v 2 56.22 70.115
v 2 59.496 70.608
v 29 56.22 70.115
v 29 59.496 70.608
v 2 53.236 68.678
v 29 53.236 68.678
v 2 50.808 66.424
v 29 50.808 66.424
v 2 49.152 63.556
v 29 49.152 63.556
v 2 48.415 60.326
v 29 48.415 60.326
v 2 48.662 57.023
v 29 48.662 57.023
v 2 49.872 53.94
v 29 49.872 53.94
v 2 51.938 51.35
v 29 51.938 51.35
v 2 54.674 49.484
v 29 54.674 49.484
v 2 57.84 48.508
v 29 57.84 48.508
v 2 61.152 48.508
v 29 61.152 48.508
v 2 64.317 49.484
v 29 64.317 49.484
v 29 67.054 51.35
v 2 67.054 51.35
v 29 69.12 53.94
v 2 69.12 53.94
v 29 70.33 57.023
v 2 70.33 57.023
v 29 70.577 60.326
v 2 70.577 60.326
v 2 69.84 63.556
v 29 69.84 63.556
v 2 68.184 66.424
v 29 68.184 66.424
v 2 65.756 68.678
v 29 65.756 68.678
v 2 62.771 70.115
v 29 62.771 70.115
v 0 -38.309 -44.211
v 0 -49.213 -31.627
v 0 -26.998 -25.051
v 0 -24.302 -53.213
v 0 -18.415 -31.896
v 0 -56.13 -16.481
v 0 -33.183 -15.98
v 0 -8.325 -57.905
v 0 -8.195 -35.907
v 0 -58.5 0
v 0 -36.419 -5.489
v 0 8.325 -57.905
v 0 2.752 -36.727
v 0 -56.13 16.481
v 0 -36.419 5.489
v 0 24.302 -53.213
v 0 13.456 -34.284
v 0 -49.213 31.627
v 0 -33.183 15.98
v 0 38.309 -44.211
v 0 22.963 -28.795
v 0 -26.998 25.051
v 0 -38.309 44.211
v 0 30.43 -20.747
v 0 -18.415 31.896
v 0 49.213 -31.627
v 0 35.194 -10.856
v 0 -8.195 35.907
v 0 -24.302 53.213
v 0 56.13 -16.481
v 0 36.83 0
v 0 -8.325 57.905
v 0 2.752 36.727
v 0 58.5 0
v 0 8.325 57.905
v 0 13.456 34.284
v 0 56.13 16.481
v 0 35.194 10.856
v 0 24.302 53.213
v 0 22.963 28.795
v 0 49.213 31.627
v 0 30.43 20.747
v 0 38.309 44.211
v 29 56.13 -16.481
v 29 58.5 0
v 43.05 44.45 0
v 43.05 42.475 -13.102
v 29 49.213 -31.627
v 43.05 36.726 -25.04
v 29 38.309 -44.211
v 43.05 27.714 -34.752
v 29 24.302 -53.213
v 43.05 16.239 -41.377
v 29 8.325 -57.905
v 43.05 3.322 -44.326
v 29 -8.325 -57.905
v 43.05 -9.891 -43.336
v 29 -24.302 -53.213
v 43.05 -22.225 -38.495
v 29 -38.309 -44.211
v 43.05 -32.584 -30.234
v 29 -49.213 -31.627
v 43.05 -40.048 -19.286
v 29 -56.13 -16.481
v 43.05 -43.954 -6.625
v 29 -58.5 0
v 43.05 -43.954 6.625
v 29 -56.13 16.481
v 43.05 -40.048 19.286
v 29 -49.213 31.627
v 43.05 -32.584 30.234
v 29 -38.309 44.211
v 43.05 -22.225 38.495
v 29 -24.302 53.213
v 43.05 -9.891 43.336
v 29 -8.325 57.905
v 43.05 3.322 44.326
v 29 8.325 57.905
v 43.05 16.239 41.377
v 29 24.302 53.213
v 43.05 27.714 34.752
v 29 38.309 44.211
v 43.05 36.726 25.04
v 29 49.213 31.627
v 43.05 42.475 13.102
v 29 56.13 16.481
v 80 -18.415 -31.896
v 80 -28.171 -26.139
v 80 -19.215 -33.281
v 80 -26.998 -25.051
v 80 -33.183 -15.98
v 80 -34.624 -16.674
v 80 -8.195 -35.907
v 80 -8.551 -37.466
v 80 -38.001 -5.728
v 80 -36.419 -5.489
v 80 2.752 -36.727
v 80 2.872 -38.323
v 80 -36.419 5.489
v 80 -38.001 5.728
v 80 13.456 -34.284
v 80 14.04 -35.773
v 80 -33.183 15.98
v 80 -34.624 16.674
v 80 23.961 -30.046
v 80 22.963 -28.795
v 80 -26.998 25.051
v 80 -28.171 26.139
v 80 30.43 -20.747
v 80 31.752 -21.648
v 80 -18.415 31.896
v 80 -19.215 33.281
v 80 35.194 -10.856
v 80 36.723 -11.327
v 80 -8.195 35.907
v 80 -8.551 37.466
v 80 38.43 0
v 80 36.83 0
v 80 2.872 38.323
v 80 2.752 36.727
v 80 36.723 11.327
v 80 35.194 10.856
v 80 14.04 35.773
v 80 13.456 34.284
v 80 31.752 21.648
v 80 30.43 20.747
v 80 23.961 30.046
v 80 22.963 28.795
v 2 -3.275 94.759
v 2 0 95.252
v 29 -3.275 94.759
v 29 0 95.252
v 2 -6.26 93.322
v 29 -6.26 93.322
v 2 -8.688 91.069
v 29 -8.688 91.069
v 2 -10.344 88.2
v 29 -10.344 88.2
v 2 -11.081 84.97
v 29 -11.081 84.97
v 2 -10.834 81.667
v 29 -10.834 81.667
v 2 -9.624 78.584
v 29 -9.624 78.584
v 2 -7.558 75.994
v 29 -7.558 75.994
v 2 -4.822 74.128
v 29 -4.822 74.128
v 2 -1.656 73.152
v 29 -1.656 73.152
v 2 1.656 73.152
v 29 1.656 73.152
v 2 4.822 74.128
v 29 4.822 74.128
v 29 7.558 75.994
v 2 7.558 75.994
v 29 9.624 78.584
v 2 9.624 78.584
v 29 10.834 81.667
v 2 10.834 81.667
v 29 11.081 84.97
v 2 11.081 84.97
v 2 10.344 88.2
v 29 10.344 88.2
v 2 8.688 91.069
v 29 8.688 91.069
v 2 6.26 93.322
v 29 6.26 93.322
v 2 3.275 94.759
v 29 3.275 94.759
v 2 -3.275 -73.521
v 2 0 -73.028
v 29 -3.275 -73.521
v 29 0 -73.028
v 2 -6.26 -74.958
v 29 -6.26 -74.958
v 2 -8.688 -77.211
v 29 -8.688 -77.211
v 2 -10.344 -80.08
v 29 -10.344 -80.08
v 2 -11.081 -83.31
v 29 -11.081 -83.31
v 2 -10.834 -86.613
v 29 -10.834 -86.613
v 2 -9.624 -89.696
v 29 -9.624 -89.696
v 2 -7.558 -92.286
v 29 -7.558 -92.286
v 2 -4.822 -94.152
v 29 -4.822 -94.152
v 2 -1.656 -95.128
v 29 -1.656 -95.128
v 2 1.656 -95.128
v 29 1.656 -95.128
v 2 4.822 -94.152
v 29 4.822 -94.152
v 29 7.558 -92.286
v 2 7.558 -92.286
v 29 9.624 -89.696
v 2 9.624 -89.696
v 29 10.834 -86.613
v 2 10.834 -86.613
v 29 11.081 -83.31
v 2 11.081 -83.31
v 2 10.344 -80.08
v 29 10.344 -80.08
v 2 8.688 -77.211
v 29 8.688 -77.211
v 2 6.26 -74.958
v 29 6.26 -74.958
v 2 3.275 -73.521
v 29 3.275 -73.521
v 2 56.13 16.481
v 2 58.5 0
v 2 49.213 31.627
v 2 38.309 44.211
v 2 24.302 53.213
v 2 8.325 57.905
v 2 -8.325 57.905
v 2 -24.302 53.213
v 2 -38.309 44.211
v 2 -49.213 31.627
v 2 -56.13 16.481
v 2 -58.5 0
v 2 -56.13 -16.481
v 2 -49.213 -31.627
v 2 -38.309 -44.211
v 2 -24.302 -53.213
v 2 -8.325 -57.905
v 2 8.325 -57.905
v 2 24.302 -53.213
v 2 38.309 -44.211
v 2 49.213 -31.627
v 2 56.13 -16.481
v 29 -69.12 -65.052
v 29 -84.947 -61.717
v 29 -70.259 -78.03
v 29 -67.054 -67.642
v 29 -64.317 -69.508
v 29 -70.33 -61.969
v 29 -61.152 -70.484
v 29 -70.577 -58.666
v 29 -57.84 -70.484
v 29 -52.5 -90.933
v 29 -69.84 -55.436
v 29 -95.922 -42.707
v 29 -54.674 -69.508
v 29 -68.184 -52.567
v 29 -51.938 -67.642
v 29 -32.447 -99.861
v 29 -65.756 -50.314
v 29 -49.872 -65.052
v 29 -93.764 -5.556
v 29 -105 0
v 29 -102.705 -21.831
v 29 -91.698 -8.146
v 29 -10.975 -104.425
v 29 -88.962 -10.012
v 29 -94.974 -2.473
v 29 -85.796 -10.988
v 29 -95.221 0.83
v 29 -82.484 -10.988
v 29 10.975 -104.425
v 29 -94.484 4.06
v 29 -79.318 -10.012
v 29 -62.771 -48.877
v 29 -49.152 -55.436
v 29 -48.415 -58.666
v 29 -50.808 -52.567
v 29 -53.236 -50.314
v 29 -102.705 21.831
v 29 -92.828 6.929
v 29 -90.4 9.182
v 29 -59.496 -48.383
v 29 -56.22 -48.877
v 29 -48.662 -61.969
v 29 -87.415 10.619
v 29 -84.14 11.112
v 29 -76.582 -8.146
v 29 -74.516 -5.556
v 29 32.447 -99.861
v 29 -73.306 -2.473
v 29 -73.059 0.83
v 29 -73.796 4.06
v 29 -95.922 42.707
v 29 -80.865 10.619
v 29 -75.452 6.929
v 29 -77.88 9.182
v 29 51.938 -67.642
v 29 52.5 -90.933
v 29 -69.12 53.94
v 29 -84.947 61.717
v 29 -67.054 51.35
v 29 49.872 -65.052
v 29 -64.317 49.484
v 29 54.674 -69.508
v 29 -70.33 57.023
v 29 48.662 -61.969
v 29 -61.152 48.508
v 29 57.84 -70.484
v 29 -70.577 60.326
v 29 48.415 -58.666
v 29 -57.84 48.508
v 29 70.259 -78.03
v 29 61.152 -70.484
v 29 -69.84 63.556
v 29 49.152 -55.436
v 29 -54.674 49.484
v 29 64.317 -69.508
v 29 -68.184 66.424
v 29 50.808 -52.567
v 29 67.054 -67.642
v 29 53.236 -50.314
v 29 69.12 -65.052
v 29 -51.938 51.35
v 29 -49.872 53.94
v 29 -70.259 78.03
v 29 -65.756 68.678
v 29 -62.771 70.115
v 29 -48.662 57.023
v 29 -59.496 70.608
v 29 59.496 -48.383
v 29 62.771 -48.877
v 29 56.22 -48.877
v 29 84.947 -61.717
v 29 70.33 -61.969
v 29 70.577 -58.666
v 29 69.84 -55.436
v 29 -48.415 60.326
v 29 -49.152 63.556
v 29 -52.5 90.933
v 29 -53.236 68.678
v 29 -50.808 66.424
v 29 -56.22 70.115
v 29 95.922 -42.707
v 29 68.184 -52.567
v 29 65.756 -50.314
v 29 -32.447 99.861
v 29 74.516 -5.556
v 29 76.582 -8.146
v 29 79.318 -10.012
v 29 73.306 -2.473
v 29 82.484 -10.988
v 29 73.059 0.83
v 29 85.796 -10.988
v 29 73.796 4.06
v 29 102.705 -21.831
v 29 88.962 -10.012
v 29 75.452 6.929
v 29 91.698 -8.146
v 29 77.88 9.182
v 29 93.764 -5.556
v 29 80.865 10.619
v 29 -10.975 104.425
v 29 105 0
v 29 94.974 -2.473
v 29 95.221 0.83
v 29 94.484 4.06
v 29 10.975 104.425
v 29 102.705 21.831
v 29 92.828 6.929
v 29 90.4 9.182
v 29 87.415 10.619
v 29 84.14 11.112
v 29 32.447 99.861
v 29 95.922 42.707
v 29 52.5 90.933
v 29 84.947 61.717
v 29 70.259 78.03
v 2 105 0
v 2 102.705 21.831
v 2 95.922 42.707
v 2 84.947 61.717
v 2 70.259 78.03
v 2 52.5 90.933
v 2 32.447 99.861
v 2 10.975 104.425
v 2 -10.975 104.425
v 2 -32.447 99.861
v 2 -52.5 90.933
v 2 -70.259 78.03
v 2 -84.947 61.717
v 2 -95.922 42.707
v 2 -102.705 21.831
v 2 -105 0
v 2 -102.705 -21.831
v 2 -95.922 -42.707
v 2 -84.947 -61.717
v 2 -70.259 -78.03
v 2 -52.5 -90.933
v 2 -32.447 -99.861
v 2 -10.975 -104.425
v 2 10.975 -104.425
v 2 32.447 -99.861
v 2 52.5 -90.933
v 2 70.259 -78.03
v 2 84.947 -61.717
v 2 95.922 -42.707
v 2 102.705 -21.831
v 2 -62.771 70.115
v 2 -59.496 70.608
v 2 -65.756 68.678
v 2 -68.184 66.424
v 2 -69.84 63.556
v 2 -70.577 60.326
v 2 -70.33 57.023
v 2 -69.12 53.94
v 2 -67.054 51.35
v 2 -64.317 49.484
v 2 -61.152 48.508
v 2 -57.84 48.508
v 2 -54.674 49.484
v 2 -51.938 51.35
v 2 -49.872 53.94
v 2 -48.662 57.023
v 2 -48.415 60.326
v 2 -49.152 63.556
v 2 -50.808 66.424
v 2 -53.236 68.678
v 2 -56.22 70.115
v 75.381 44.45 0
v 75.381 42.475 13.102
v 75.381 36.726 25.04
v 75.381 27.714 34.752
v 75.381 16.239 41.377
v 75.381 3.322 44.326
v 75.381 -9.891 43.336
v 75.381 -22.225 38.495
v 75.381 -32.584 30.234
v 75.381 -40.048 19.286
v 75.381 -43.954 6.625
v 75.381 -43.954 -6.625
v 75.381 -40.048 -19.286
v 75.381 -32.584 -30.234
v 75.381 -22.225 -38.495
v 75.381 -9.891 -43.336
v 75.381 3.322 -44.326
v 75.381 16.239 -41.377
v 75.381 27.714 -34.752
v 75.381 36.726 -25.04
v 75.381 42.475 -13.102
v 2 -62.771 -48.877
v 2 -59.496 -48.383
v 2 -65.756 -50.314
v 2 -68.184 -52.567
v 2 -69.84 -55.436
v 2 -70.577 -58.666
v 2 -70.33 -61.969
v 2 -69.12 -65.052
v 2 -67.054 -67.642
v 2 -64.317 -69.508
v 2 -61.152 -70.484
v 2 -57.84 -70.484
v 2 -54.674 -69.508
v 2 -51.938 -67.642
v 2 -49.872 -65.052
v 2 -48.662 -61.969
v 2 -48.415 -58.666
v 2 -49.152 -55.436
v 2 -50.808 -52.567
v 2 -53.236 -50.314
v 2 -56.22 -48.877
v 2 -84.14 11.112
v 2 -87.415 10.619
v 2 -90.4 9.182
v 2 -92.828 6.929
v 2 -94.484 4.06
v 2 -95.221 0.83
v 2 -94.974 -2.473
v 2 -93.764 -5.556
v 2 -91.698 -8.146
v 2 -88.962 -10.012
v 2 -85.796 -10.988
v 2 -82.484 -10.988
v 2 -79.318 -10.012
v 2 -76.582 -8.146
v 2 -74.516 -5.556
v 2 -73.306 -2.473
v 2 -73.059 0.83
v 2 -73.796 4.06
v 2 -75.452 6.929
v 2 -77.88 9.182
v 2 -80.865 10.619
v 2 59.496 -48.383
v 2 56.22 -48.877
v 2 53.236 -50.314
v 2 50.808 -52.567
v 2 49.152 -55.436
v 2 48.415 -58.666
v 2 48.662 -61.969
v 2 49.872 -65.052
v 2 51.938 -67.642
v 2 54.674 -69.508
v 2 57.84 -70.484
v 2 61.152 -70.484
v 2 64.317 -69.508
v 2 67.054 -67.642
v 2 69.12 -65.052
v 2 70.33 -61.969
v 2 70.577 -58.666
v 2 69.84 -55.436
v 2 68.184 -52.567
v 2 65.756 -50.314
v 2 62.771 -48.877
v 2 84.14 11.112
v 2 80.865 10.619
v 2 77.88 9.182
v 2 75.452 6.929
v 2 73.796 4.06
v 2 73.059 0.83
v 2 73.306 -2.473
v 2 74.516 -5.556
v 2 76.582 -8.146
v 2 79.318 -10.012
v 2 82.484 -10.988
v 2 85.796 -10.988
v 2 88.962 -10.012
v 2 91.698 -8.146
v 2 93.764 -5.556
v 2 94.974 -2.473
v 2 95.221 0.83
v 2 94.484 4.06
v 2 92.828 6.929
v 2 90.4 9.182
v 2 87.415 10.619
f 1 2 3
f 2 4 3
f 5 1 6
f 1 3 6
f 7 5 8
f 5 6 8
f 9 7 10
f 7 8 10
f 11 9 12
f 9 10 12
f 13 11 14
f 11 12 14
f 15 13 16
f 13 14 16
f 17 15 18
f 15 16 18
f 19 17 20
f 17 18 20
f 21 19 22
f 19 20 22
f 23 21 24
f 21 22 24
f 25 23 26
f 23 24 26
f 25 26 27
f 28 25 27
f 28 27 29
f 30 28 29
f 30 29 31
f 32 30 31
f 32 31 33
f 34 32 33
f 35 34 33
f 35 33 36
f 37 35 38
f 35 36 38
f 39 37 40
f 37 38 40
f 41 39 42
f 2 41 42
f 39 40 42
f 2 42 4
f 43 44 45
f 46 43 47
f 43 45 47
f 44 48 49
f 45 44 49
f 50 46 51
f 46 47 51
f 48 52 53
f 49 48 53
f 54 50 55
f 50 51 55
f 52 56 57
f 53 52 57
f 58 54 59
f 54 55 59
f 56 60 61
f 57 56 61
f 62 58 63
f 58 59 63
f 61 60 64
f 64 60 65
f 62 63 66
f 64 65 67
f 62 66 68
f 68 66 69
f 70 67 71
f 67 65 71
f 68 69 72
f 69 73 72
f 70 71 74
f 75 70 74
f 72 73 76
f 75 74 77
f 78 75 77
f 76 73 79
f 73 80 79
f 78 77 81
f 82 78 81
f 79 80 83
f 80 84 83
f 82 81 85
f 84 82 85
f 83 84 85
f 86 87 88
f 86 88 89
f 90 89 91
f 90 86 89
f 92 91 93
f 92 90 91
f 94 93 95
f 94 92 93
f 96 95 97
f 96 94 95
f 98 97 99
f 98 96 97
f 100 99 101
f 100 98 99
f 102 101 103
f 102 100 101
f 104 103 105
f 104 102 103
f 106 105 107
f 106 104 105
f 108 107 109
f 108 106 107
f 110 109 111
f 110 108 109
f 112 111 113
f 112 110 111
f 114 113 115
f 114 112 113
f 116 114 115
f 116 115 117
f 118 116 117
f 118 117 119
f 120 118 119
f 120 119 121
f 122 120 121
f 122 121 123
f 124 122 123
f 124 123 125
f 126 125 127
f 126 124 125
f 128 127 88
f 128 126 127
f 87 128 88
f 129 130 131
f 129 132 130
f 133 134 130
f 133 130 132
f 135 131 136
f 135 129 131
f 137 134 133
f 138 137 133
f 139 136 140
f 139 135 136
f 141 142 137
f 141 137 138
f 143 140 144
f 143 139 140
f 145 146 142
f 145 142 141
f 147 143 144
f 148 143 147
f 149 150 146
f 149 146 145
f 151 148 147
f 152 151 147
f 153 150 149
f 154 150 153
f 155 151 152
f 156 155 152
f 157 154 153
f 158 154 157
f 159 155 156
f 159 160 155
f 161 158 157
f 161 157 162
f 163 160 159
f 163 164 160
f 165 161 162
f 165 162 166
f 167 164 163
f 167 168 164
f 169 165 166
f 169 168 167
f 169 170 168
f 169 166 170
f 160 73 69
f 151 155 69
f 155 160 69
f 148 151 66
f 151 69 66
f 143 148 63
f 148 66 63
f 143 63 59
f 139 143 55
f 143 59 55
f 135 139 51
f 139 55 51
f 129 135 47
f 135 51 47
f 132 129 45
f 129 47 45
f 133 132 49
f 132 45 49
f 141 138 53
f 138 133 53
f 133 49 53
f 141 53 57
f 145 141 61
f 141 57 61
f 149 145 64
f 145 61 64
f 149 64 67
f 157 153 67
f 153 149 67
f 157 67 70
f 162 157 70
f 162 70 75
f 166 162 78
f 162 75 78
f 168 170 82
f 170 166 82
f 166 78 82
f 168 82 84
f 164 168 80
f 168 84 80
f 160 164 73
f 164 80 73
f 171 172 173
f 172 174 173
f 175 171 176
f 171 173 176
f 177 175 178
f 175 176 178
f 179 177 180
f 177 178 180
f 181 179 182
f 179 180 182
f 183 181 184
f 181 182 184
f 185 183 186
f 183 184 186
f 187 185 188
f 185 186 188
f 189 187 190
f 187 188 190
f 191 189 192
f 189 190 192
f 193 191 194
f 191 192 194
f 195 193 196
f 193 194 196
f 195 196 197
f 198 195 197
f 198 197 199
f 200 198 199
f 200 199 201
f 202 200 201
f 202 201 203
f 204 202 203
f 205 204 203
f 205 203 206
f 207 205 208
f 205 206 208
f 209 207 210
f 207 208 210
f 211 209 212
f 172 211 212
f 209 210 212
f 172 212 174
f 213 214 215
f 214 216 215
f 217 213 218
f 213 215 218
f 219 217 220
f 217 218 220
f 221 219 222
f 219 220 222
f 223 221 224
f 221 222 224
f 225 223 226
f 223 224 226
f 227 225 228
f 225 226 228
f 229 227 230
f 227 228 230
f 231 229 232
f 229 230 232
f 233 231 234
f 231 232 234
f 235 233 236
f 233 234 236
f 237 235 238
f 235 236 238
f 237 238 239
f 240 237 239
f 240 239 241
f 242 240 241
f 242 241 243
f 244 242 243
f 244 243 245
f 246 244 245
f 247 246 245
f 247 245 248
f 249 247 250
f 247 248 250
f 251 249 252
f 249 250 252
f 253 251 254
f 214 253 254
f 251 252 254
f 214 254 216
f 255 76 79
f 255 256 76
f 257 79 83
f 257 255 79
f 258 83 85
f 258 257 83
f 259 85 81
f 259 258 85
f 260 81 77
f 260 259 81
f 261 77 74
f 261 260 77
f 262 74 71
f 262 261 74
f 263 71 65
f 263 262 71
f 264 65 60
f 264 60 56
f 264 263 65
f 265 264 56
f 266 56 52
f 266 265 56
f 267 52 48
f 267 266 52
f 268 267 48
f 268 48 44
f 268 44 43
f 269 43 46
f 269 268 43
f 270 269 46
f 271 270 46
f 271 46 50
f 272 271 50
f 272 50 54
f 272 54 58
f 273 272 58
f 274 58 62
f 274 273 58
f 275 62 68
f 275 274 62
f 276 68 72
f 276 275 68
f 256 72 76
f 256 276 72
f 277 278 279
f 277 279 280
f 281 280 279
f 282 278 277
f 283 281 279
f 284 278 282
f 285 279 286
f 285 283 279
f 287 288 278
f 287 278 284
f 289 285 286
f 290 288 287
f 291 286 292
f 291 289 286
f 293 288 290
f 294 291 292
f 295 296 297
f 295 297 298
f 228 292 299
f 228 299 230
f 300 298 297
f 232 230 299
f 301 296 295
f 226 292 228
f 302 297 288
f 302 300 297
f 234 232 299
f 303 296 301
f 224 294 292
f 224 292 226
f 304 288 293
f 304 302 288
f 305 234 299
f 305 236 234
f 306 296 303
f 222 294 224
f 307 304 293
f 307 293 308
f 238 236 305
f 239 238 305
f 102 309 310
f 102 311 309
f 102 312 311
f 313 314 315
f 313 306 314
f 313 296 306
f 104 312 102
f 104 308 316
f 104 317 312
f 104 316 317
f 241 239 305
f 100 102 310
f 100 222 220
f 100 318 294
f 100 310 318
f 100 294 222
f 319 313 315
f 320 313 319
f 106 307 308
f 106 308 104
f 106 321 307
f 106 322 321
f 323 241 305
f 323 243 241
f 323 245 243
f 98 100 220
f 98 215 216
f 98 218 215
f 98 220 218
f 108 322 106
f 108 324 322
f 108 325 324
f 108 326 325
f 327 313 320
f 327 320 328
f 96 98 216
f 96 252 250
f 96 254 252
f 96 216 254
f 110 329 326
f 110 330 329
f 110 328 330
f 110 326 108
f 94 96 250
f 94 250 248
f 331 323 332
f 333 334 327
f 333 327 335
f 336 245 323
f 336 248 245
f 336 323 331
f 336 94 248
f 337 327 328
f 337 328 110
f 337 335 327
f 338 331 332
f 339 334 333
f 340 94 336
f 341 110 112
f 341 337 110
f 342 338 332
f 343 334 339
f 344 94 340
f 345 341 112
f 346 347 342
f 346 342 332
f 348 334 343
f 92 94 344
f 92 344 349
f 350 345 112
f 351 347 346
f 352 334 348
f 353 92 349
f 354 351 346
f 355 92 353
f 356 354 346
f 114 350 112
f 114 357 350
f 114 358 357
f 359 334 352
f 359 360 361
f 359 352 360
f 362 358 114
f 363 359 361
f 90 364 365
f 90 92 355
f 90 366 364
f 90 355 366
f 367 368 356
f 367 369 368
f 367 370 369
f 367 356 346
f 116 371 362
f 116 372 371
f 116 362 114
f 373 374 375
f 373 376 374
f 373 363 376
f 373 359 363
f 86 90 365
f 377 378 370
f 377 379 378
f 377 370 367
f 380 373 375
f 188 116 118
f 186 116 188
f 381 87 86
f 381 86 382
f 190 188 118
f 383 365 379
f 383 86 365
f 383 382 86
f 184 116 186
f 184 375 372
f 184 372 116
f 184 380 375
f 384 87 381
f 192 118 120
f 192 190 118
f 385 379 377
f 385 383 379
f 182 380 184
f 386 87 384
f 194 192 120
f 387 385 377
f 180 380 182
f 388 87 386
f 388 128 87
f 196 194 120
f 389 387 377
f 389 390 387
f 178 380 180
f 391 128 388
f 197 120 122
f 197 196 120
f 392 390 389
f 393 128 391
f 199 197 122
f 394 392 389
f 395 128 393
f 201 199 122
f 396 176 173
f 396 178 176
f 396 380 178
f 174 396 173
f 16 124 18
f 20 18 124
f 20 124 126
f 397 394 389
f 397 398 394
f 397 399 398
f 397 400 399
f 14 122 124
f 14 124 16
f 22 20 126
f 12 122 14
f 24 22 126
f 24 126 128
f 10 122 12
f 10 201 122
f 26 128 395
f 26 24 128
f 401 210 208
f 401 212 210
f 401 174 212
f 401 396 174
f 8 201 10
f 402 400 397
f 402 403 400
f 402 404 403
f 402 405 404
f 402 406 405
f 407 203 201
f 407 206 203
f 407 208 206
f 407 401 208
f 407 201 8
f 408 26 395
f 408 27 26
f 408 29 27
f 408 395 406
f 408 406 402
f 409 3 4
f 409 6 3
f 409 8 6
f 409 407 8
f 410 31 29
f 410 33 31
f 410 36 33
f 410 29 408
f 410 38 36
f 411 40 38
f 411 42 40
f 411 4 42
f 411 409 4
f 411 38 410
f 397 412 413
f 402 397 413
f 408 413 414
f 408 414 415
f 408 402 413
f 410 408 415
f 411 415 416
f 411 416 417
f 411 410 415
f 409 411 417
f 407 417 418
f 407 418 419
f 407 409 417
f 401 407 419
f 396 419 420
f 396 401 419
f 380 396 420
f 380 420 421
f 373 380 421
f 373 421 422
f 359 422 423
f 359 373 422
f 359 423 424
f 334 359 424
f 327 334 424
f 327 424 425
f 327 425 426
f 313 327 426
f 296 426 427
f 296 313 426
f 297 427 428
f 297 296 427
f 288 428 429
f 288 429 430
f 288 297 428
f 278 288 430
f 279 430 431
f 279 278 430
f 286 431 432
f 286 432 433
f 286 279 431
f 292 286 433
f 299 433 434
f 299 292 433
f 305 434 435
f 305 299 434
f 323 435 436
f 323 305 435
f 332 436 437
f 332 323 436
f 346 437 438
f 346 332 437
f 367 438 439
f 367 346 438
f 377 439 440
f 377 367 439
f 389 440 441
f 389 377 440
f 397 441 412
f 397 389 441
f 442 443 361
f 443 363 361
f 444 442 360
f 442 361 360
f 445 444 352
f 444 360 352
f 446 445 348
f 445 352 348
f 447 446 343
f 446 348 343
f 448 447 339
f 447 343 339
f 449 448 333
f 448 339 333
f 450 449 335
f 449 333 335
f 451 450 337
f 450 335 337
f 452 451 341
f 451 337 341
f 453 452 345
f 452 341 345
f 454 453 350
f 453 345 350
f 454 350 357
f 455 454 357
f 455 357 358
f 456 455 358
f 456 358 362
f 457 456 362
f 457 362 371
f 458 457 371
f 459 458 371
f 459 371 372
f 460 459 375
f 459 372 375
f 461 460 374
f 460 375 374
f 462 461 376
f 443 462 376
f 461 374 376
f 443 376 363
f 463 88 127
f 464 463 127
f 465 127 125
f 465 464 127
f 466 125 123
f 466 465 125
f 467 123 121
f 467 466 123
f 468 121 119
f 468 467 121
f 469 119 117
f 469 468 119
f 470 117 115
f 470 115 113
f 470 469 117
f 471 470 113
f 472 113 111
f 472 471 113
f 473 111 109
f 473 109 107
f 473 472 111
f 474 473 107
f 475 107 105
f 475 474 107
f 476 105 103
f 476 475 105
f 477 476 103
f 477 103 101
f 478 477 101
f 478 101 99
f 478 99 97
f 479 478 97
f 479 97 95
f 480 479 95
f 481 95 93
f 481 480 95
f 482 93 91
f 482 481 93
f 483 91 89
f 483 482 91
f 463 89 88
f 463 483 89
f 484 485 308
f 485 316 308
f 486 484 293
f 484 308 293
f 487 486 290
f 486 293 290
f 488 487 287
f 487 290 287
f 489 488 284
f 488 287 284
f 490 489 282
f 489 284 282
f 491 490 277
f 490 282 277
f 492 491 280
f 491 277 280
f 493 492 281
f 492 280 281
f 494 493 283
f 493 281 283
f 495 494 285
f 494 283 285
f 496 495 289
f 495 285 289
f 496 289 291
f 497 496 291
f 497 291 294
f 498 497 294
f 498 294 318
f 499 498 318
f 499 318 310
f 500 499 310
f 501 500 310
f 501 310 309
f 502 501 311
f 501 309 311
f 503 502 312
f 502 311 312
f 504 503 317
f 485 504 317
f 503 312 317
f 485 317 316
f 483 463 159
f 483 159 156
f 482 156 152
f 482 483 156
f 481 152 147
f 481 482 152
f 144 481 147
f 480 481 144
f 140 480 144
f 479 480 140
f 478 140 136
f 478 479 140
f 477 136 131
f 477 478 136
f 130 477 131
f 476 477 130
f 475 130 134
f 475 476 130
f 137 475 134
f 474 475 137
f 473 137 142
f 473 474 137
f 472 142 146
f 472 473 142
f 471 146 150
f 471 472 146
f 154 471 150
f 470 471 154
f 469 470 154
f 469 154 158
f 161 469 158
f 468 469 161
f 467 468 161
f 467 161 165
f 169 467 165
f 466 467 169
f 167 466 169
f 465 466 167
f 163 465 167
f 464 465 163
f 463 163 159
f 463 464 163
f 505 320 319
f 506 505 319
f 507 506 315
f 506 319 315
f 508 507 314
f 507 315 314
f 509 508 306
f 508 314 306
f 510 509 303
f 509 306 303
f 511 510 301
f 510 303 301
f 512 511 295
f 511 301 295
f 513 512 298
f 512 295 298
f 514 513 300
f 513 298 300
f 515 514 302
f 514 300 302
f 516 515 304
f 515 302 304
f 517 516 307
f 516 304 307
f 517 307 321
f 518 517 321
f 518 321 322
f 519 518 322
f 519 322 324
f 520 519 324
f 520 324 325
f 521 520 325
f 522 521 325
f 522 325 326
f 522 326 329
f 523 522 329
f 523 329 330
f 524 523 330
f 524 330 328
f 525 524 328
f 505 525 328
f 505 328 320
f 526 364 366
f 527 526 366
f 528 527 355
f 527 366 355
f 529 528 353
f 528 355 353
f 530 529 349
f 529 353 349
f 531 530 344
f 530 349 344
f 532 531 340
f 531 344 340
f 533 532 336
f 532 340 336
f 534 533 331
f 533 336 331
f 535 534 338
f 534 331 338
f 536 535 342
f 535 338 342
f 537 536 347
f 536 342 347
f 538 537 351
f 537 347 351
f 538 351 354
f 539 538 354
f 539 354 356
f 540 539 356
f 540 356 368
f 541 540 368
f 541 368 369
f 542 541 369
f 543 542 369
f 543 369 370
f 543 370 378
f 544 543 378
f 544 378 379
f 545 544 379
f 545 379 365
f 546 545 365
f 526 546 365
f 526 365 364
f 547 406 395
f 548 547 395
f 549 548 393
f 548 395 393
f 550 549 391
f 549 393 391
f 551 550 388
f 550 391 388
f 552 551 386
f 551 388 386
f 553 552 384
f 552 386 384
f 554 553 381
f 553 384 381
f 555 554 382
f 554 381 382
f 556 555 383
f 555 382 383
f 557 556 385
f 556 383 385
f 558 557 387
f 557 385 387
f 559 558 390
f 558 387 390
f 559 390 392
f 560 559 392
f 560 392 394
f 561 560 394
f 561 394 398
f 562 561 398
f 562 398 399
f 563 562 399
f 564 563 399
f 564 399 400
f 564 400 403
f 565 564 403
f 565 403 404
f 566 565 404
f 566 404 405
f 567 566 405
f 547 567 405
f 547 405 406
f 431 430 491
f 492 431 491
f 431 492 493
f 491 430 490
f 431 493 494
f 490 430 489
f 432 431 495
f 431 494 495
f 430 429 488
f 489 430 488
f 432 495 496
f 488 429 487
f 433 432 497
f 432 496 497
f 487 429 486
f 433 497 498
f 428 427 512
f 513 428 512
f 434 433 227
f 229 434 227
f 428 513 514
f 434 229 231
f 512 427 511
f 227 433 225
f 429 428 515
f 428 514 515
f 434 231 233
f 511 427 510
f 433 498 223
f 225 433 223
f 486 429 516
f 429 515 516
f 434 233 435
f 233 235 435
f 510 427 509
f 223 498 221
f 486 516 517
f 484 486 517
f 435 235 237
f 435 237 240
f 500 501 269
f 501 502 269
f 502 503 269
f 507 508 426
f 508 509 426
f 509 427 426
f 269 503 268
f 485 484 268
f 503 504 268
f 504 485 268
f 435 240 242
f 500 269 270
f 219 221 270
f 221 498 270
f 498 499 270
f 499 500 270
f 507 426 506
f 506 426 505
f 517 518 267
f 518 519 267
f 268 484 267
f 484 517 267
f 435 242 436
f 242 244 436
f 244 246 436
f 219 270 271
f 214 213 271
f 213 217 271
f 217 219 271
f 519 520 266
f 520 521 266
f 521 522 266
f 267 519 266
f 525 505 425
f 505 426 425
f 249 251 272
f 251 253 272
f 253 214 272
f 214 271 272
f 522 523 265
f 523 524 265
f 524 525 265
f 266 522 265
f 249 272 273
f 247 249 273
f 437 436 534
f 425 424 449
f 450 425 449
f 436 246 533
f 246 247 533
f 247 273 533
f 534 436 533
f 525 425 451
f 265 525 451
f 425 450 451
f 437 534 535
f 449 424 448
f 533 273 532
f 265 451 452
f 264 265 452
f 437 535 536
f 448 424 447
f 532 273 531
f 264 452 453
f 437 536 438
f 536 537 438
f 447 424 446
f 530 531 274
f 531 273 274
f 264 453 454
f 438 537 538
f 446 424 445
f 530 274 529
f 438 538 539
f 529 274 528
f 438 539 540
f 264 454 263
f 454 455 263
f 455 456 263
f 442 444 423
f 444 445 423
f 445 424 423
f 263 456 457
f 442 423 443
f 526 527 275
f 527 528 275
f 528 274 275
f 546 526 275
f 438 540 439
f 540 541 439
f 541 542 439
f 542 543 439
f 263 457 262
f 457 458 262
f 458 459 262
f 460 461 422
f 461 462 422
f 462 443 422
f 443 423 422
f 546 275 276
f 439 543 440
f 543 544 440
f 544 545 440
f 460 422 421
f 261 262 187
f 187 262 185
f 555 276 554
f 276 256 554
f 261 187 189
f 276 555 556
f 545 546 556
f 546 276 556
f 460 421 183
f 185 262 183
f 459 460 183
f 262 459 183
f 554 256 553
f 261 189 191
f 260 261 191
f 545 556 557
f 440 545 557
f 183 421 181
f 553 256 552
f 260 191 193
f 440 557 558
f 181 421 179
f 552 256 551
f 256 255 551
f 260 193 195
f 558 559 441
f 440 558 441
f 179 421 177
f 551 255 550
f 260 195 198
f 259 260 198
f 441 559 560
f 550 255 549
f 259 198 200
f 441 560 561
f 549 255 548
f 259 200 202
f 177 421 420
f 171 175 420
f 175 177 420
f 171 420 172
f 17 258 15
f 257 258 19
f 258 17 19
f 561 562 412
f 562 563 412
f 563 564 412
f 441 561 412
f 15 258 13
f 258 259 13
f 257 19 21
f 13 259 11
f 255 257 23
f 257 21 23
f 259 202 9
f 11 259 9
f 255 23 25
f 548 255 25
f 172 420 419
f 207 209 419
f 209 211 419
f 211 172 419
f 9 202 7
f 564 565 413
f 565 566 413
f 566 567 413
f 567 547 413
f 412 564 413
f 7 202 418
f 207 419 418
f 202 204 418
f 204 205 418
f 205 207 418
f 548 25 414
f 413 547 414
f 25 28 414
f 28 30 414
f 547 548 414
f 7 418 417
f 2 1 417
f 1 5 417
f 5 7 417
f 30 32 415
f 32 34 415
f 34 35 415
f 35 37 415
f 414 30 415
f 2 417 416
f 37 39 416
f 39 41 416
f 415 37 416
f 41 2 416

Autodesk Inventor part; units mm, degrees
ref_plane "YZ Plane" through (0, 0, 0) normal (1, 0, 0) x (0, 1, 0)
ref_plane "XZ Plane" through (0, 0, 0) normal (0, 1, 0) x (-1, 0, 0)
ref_plane "XY Plane" through (0, 0, 0) normal (0, 0, 1) x (1, 0, 0)
sketch "Sketch1" plane through (0, 0, 0) normal (0, 0, 1) x (1, 0, 0)
  line L0 (0, 0) -> (109.4884, 0)
  line L1 (0, 36.83) -> (0, 58.5)
  line L2 (0, 58.5) -> (2, 58.5)
  line L3 (2, 58.5) -> (2, 105)
  line L4 (2, 105) -> (29, 105)
  line L5 (29, 105) -> (29, 58.5)
  line L6 (29, 58.5) -> (43.05, 44.45)
  line L7 (43.05, 44.45) -> (75.3807, 44.45)
  line L8 (75.3807, 44.45) -> (80, 38.43)
  line L9 (80, 38.43) -> (80, 36.83)
  line L10 (80, 36.83) -> (0, 36.83)
  point P0 (0, 47.665)
  dimension "d5" = 2
  dimension "d6" = 210
  dimension "d7" = 27
  dimension "d8" = 117
  dimension "d9" = 45
  dimension "d10" = 78
  dimension "d28" = 73.66
  dimension "d29" = 88.9
  dimension "d30" = 37.5
  dimension "d31" = 1.6
revolve "Revolution1" add sketch "Sketch1" angle 360 about axis through (0, 0, 0) along (1, 0, 0)
sketch "Sketch2" plane through (2, 0, 0) normal (-1, 0, 0) x (0, 0, 1)
  point P0 (0, 0)
  point P1 (0, 84.14)
  dimension "d12" = 84.14
hole "Hole1" at (2, 84.14, 0) direction (1, 0, 0) diameter 22.225 end up to surface
pattern_circular "Circular Pattern1" count 8 over 360 about axis through (15.5, 0, 0) along (1, 0, 0) of "Hole1"
properties part number "Flange 3 in" material "ASTM A105 Gr.B"
